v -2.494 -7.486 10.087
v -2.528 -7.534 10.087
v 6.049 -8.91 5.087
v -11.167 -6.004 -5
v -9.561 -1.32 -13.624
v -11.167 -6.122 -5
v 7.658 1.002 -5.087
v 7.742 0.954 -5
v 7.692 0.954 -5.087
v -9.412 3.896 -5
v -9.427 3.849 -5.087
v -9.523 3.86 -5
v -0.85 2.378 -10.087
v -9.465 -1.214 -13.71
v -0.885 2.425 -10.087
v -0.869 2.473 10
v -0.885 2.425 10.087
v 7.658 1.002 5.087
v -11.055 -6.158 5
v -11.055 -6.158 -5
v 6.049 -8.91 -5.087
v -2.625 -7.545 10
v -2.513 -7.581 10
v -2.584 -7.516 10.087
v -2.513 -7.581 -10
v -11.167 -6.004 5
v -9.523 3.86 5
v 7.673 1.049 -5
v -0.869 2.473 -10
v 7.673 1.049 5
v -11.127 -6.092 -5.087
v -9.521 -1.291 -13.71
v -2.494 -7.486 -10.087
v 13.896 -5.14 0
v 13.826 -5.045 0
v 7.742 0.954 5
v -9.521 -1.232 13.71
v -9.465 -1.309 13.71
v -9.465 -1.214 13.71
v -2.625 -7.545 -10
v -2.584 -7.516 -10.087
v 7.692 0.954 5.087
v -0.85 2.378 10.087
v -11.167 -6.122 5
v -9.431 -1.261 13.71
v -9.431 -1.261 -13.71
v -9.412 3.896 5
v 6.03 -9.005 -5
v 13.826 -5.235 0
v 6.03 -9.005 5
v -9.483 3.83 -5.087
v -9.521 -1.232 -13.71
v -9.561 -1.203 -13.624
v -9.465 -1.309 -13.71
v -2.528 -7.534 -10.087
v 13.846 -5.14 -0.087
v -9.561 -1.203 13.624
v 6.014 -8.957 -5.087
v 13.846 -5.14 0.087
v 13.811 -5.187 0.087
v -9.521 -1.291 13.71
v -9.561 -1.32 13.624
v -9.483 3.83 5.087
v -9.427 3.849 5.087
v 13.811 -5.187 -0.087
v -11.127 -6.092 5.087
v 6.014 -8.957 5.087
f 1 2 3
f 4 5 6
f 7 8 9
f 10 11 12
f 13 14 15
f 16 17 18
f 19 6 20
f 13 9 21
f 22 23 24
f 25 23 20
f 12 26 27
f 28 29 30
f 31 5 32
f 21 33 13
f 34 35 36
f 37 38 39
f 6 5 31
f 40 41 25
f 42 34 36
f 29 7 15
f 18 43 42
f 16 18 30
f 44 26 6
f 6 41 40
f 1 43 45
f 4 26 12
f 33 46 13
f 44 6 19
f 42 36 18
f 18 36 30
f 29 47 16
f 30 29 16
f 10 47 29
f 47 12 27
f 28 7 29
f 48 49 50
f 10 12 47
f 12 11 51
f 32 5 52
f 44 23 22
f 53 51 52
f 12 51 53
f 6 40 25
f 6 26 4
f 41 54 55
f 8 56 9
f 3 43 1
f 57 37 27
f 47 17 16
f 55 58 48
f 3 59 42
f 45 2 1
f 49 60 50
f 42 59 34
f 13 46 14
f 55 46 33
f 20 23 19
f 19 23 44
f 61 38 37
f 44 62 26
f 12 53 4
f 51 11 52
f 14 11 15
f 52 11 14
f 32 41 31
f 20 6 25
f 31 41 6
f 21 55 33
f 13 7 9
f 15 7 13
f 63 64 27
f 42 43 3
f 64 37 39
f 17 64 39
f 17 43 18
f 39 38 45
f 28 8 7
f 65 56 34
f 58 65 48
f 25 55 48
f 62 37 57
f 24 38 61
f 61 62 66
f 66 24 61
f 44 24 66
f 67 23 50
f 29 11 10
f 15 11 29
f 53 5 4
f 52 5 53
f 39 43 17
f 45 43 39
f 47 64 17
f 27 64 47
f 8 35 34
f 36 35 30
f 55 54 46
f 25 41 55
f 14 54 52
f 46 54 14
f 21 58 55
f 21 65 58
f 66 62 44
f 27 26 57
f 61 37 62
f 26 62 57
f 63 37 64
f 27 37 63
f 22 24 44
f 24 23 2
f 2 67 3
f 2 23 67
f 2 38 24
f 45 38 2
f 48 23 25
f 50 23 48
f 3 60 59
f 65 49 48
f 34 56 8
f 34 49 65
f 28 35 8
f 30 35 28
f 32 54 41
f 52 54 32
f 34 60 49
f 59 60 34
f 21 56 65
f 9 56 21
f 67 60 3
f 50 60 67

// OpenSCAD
// Auto-generated OpenSCAD file

    inner_points = 10*[[0.599886064142325, -0.8909680205958462, -0.5000000000000165], [0.7642449049774599, 0.095432593474994, -0.500000000000021], [-1.1086099160454883, -0.6062901575962651, 0.500000000000021], [-0.9442510752103533, 0.3801104564745751, 0.5000000000000165], [0.599886064142347, -0.8909680205958453, 0.4999999999999834], [0.764244904977482, 0.09543259347499483, 0.49999999999997896], [-0.2543619259516038, -0.7486290890960565, -0.9999999999999978], [-0.09000308511646875, 0.23777152497478365, -1.0000000000000022], [-0.2543619259515596, -0.7486290890960547, 1.0000000000000022], [-0.09000308511642456, 0.23777152497478538, 0.9999999999999978], [-1.1086099160455103, -0.606290157596266, -0.49999999999997896], [-0.9442510752103753, 0.3801104564745742, -0.4999999999999834], [1.3795560477359692, -0.51398696446291, -3.397282455352979e-14], [-0.9480517821689757, -0.12614969085949718, 1.3623724356958116], [-0.948051782169036, -0.12614969085949948, -1.3623724356957776]];

    outer_points = 10*[[-1.0227603980993214, -0.3734255004598836, 0.25399717259450516], [-0.9712245325180885, 0.3734255004598836, -0.40899425795639943], [0.9712245325180885, -0.3734255004598836, 0.40899425795639943], [1.0227603980993214, 0.3734255004598836, -0.25399717259450516], [-0.47413873270521345, -0.9493249594098434, -0.3521002465068624], [-0.4226028671239805, -0.20247395849007616, -1.0150916770577671], [-0.5743895981847245, 0.20247395849007616, 0.9375931343768199], [-0.5228537326034916, 0.9493249594098434, 0.27460170382591526], [0.5228537326034916, -0.9493249594098434, -0.27460170382591526], [0.5743895981847245, -0.20247395849007616, -0.9375931343768199], [0.4226028671239805, 0.20247395849007616, 1.0150916770577671], [0.47413873270521345, 0.9493249594098434, 0.3521002465068624], [-1.312748714738331, -0.5230596990703646, -0.6912627825601987], [1.4038013919276195, -0.5230596990703646, -0.4800990258499658], [-0.09105267718928864, 1.0461193981407293, 1.1713618084101645]];

    // Convex hull for inner set (I)
    module inner_hull() {
        hull() {
            for (p = inner_points) {
                translate(p) sphere(r=0.1);
            }
        }
    }

    // Convex hull for outer set (O) minus inner hull (O \ I)
    module outer_minus_inner() {
        difference() {
            hull() {
                for (p = outer_points) {
                    translate(p) sphere(r=0.1);
                }
            }
            inner_hull(); // Subtract inner hull
        }
    }

    // Convex hull for outer set (O) minus all translated inner hulls
    module outer_minus_AllTranslationInner() {
        difference() {
            hull() {
                for (p = outer_points) {
                    translate(p) sphere(r=0.1);
                }
            }
            hull() {
                translate([0,0,50]) inner_hull();
                translate([0,0,-50]) inner_hull();
            }; // Subtract translated inner hulls
        }
    }

    // Difference between outer_minus_inner and outer_minus_AllTranslationInner
    module outer_minus_inner_diff() {
        difference() {
            // Outer minus inner
            difference() {
                hull() {
                    for (p = outer_points) {
                        translate(p) sphere(r=0.1);
                    }
                }
                inner_hull();
            }

            // Subtract Outer minus AllTranslationInner
            difference() {
                hull() {
                    for (p = outer_points) {
                        translate(p) sphere(r=0.1);
                    }
                }
                hull() {
                    translate([0,0,50]) inner_hull();
                    translate([0,0,-50]) inner_hull();
                };
            }
        }
    }

    // Rendering all with colors applied
    color([1, 0, 0, 0.5]) inner_hull(); // Transparent red
    
